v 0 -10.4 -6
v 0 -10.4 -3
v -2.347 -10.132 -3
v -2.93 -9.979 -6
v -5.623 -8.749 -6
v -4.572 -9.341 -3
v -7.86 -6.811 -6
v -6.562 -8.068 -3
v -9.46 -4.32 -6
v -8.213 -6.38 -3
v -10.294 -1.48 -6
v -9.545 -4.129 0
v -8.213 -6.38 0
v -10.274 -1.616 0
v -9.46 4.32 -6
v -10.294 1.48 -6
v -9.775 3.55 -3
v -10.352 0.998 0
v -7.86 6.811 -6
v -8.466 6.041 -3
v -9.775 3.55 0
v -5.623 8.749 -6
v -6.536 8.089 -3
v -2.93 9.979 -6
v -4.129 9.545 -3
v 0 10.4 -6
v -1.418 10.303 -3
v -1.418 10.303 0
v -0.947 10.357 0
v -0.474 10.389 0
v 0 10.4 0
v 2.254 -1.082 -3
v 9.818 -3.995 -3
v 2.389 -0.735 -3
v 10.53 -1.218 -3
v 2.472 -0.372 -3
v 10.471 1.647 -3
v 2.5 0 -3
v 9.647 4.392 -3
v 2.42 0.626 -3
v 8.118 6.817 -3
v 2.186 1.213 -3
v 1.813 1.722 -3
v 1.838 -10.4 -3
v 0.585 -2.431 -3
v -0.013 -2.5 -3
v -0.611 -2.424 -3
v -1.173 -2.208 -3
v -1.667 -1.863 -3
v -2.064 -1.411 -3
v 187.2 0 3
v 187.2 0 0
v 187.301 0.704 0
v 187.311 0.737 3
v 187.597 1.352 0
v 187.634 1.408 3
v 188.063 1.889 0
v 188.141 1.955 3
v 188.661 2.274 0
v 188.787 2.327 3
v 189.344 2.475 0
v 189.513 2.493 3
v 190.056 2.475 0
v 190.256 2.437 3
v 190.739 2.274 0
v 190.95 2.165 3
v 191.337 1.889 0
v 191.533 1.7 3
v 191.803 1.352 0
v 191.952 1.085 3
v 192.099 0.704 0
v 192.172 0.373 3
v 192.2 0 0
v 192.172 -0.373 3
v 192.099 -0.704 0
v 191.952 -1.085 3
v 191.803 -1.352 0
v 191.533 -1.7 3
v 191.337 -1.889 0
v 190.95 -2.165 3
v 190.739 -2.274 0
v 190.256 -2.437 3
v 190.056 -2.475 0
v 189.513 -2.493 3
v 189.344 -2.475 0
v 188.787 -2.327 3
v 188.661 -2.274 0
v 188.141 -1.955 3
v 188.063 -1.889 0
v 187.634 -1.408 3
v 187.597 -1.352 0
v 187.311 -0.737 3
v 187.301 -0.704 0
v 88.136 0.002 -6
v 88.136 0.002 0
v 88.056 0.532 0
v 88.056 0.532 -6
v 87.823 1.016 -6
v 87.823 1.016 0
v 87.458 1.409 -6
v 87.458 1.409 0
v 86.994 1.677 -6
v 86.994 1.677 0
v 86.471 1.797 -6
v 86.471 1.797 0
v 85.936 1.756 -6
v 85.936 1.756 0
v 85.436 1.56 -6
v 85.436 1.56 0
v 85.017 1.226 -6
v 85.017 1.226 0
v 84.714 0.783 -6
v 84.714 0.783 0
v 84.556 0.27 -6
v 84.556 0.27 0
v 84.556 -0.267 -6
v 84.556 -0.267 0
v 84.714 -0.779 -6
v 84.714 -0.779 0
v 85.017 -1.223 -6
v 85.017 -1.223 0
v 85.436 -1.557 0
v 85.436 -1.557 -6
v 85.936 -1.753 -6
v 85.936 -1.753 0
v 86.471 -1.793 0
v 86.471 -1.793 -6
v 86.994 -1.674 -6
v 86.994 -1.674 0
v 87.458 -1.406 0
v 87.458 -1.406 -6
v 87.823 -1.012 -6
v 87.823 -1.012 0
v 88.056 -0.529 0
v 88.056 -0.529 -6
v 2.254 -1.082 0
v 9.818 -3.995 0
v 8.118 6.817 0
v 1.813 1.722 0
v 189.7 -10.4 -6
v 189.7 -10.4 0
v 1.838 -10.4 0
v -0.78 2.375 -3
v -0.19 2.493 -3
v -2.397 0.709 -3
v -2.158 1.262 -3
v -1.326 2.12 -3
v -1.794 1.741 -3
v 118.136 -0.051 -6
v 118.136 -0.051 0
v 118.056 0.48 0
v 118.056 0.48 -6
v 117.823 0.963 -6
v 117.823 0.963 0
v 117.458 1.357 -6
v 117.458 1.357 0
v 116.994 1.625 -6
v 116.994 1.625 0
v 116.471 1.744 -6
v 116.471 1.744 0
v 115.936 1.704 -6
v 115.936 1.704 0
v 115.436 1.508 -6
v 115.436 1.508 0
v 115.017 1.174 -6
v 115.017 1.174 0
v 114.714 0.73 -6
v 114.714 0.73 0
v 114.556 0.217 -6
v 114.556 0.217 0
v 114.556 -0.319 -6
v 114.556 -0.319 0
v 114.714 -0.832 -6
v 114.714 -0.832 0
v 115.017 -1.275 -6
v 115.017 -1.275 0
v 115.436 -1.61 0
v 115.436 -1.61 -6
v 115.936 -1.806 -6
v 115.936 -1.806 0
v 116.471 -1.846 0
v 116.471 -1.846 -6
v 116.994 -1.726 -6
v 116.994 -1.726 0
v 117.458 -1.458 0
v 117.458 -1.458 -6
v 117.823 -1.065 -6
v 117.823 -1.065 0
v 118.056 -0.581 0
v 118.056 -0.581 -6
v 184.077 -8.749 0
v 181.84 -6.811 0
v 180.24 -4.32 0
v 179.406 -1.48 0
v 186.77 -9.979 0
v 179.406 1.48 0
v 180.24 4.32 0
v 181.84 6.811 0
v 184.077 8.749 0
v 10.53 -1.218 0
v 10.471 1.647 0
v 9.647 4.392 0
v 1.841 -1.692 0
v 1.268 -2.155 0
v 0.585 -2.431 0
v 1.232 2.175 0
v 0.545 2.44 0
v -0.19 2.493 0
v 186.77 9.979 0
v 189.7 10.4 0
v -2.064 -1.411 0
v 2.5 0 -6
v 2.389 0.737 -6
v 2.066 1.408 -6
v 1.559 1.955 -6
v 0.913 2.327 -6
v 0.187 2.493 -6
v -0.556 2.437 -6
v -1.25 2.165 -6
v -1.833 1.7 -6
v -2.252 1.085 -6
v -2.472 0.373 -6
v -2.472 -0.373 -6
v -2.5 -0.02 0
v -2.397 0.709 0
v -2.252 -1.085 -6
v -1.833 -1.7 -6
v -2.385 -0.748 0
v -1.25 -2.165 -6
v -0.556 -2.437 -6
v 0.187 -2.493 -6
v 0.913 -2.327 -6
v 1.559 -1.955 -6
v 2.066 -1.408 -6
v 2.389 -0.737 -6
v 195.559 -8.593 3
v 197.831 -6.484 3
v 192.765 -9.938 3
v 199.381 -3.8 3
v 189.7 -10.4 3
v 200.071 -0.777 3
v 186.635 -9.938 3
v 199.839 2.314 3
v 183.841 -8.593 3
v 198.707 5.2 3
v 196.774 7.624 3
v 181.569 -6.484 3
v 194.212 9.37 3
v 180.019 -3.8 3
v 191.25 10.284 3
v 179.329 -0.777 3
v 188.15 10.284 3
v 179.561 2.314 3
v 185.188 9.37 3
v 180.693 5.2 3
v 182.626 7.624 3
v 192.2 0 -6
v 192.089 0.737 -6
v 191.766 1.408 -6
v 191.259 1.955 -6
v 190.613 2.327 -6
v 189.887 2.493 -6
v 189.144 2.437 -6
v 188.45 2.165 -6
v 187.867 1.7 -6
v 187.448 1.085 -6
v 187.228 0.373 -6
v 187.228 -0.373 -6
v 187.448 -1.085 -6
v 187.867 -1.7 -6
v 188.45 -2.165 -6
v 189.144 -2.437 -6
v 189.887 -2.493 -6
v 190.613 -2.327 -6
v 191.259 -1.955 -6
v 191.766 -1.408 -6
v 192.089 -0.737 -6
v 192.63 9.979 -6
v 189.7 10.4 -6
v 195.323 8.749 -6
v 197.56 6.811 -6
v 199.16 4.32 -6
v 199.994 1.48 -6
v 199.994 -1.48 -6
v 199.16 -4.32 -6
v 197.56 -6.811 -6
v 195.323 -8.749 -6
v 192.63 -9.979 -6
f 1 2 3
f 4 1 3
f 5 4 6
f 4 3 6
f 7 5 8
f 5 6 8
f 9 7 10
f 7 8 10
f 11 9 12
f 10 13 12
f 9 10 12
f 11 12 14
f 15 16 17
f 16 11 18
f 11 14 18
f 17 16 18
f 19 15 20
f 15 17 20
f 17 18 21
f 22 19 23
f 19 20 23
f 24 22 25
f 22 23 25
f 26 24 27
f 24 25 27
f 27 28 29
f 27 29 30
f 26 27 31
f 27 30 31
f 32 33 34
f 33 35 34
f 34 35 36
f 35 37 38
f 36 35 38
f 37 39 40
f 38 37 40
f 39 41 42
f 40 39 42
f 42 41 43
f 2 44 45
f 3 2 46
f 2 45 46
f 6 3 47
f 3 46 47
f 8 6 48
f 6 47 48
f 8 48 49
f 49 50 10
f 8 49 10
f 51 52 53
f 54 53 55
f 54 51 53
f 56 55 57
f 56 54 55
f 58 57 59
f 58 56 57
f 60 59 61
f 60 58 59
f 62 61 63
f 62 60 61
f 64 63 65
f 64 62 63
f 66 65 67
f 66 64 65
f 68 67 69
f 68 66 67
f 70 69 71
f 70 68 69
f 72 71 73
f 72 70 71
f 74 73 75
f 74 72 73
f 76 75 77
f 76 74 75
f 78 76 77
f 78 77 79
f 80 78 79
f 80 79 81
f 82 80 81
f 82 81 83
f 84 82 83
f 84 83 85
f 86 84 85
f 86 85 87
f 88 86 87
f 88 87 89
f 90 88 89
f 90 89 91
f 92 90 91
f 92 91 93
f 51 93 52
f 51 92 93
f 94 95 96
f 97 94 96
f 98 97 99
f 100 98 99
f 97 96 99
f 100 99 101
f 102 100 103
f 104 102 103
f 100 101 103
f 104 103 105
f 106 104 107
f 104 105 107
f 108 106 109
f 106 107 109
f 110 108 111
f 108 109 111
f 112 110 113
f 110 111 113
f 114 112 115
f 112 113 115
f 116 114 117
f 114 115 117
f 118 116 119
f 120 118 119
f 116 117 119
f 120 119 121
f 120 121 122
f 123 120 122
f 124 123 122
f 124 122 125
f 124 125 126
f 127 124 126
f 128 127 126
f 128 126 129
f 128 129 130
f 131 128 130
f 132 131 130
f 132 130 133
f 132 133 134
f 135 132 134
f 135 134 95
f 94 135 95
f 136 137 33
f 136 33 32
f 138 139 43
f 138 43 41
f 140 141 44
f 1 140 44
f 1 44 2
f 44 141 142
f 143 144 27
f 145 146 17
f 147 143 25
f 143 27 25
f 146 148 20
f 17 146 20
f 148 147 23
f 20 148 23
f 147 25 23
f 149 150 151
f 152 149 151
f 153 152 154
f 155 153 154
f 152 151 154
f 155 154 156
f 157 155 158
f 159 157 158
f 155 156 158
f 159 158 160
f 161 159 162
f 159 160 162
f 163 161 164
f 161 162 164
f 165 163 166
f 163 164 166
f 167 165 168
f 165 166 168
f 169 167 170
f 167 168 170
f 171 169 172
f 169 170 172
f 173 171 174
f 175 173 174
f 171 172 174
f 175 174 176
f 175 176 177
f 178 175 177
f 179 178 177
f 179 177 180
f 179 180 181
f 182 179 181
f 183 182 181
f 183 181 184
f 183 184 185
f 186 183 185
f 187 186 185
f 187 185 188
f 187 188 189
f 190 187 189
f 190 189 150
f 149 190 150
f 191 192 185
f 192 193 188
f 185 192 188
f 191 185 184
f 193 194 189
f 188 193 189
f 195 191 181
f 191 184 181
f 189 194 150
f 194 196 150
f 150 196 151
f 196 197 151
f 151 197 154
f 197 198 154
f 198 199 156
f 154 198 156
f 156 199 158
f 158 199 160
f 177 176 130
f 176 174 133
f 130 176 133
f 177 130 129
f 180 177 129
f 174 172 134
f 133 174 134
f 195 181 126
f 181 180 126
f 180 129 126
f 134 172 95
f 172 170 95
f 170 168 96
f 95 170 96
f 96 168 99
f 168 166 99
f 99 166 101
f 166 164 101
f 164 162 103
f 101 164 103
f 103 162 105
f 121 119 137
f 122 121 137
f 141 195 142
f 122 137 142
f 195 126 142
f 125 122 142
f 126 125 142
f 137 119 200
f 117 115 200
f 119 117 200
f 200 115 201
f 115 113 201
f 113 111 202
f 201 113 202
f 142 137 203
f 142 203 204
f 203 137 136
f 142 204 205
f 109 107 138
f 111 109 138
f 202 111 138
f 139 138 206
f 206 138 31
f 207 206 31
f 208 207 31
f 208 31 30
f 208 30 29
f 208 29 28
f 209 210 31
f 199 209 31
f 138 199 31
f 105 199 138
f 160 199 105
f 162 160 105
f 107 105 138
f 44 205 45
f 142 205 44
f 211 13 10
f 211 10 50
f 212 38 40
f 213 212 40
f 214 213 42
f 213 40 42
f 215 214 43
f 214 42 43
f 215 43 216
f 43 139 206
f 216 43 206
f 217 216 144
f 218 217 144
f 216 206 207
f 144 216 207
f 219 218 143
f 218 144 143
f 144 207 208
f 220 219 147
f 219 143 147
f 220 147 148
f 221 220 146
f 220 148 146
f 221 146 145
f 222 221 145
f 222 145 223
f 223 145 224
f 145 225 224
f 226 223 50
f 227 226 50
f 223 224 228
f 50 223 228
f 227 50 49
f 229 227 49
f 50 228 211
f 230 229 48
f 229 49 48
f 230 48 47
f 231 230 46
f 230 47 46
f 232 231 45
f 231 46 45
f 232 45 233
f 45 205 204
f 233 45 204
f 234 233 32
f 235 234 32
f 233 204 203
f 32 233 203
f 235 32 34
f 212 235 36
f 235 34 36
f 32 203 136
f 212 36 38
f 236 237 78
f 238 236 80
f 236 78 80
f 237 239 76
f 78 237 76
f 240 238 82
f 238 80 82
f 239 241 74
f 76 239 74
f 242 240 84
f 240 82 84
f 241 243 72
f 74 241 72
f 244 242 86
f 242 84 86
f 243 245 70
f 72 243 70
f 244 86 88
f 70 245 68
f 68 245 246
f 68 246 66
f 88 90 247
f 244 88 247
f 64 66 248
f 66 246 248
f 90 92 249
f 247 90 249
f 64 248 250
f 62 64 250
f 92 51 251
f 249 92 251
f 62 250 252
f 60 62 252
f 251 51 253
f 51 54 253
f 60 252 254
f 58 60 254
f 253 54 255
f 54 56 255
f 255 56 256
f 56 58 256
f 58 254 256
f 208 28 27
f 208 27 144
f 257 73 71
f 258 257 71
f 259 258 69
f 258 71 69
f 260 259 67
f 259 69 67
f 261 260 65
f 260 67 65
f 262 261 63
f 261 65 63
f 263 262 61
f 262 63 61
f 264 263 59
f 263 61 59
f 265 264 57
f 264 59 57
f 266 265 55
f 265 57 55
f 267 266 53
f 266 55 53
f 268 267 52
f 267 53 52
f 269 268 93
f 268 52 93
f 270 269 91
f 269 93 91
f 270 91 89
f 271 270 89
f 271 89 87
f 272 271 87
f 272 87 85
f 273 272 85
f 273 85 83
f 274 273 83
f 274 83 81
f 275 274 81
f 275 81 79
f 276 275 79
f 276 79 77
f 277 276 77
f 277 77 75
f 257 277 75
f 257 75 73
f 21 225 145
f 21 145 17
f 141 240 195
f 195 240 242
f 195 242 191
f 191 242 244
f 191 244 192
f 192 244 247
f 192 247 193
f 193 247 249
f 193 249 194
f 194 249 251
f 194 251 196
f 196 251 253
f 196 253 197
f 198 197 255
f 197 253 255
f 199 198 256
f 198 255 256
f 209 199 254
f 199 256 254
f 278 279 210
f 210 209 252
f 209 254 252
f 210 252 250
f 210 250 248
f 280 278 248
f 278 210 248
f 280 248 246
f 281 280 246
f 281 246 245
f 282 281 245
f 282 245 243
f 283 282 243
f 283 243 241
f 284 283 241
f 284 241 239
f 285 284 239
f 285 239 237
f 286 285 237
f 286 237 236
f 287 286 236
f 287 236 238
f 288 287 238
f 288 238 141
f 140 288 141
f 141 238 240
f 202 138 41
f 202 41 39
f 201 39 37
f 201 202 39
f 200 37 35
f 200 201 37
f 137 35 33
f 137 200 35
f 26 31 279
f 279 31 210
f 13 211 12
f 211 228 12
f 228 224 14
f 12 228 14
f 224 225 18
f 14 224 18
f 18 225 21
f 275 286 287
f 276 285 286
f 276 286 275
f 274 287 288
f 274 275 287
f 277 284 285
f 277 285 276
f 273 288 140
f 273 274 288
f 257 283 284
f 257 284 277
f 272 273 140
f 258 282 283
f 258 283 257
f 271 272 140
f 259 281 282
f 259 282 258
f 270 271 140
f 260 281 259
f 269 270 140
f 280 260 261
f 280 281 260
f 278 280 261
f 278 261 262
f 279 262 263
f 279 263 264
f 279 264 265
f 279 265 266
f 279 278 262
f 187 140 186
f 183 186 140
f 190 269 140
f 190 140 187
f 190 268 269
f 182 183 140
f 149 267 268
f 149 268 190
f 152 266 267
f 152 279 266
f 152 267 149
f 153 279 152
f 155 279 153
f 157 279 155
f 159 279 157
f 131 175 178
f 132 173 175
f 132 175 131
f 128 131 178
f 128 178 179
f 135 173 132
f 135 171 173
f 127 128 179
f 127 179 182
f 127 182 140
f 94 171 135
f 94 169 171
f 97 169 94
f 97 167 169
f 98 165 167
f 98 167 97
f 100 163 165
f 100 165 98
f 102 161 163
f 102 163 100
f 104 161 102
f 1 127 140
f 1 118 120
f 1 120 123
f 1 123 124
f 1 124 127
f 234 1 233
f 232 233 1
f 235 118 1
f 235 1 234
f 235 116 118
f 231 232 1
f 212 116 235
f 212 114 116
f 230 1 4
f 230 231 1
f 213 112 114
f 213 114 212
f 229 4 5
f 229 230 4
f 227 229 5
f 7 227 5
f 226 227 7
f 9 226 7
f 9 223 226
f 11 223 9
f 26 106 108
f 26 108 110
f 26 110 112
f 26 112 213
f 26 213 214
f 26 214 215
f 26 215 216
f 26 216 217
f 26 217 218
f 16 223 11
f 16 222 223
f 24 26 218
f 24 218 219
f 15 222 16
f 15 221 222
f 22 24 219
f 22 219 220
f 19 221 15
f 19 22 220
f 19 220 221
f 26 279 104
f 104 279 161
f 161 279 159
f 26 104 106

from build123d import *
from build123d.topology import SkipClean

# Parameters (mm, degrees)
SKETCH1_R            = 2.5
BOSS_EXTRUDE1_DEPTH  = 6
CUT_EXTRUDE3_DEPTH   = 3
BOSS_EXTRUDE2_START  = 3
SKETCH4_R            = 2.5
BOSS_EXTRUDE2_DEPTH  = 3
M3_CLEARANCE_HOLE1_D = 3.6


with BuildPart() as part:
    # Sketch1 → Boss-Extrude1 (new body)
    with BuildSketch(Plane.XY):
        with BuildLine():
            Line((189.7, -10.4), (0, -10.4))
            ThreePointArc((0, -10.4), (-10.4, 0), (0, 10.4))
            Line((0, 10.4), (189.7, 10.4))
            ThreePointArc((189.7, 10.4), (200.1, 0), (189.7, -10.4))
        make_face()
        Circle(SKETCH1_R, mode=Mode.SUBTRACT)
        with Locations((189.7, 0)):
            Circle(SKETCH1_R, mode=Mode.SUBTRACT)
    extrude(amount=BOSS_EXTRUDE1_DEPTH)

    # Sketch6 → Cut-Extrude3 (cut)
    with BuildSketch(Plane(origin=(0, 0, 0), x_dir=(-1, 0, 0), z_dir=(0, 0, -1))):
        with BuildLine():
            ThreePointArc((0.189684667, 2.492793559), (1.571265552, 1.944511395), (2.39740304, 0.708843186))
            Line((2.39740304, 0.708843186), (9.962077265, 3.621742201))
            ThreePointArc((9.962077265, 3.621742201), (6.66216594, 8.244728315), (1.449377234, 10.500443116))
            Line((1.449377234, 10.500443116), (0.189684667, 2.492793559))
        make_face()
        with BuildLine():
            ThreePointArc((2.063980215, -1.41066852), (0.89836349, -2.333011582), (-0.584825314, -2.430633529))
            Line((-0.584825314, -2.430633529), (-1.844517881, -10.438283086))
            ThreePointArc((-1.844517881, -10.438283086), (3.809061198, -9.891969106), (8.368961872, -6.505419062))
            Line((8.368961872, -6.505419062), (2.063980215, -1.41066852))
        make_face()
        with BuildLine():
            Line((-9.818339107, -3.995024054), (-2.253664882, -1.082125039))
            ThreePointArc((-2.253664882, -1.082125039), (-2.469629042, 0.388500187), (-1.812577726, 1.721790343))
            Line((-1.812577726, 1.721790343), (-8.117559384, 6.816540886))
            ThreePointArc((-8.117559384, 6.816540886), (-10.471227138, 1.647240791), (-9.818339107, -3.995024054))
        make_face()
    extrude(amount=-CUT_EXTRUDE3_DEPTH, mode=Mode.SUBTRACT)

    # Sketch4 → Boss-Extrude2 (add)
    with SkipClean():  # the faces are left unmerged after this step: merging them gives an invalid solid
        with BuildSketch(Plane(origin=(0, 0, 0), x_dir=(-1, 0, 0), z_dir=(0, 0, -1)).offset(BOSS_EXTRUDE2_START)):
            with BuildLine():
                ThreePointArc((-189.7, 10.4), (-200.1, 0), (-189.7, -10.4))
                ThreePointArc((-189.7, -10.4), (-179.3, 0), (-189.7, 10.4))
            make_face()
            with Locations((-189.7, 0)):
                Circle(SKETCH4_R, mode=Mode.SUBTRACT)
        extrude(amount=-BOSS_EXTRUDE2_DEPTH)


with BuildPart() as body_2:
    # Mirror1: mirrored copy
    add(part.part.mirror(Plane.XY))

    # M3 Clearance Hole1 (through all)
    with Locations(Plane(origin=(0, 0, -6), x_dir=(-1, 0, 0), z_dir=(0, 0, -1))):
        with Locations((-116.336074354, -0.050784287), (-86.336165629, 0.001543951)):
            Hole(M3_CLEARANCE_HOLE1_D / 2)


solid = body_2.part
